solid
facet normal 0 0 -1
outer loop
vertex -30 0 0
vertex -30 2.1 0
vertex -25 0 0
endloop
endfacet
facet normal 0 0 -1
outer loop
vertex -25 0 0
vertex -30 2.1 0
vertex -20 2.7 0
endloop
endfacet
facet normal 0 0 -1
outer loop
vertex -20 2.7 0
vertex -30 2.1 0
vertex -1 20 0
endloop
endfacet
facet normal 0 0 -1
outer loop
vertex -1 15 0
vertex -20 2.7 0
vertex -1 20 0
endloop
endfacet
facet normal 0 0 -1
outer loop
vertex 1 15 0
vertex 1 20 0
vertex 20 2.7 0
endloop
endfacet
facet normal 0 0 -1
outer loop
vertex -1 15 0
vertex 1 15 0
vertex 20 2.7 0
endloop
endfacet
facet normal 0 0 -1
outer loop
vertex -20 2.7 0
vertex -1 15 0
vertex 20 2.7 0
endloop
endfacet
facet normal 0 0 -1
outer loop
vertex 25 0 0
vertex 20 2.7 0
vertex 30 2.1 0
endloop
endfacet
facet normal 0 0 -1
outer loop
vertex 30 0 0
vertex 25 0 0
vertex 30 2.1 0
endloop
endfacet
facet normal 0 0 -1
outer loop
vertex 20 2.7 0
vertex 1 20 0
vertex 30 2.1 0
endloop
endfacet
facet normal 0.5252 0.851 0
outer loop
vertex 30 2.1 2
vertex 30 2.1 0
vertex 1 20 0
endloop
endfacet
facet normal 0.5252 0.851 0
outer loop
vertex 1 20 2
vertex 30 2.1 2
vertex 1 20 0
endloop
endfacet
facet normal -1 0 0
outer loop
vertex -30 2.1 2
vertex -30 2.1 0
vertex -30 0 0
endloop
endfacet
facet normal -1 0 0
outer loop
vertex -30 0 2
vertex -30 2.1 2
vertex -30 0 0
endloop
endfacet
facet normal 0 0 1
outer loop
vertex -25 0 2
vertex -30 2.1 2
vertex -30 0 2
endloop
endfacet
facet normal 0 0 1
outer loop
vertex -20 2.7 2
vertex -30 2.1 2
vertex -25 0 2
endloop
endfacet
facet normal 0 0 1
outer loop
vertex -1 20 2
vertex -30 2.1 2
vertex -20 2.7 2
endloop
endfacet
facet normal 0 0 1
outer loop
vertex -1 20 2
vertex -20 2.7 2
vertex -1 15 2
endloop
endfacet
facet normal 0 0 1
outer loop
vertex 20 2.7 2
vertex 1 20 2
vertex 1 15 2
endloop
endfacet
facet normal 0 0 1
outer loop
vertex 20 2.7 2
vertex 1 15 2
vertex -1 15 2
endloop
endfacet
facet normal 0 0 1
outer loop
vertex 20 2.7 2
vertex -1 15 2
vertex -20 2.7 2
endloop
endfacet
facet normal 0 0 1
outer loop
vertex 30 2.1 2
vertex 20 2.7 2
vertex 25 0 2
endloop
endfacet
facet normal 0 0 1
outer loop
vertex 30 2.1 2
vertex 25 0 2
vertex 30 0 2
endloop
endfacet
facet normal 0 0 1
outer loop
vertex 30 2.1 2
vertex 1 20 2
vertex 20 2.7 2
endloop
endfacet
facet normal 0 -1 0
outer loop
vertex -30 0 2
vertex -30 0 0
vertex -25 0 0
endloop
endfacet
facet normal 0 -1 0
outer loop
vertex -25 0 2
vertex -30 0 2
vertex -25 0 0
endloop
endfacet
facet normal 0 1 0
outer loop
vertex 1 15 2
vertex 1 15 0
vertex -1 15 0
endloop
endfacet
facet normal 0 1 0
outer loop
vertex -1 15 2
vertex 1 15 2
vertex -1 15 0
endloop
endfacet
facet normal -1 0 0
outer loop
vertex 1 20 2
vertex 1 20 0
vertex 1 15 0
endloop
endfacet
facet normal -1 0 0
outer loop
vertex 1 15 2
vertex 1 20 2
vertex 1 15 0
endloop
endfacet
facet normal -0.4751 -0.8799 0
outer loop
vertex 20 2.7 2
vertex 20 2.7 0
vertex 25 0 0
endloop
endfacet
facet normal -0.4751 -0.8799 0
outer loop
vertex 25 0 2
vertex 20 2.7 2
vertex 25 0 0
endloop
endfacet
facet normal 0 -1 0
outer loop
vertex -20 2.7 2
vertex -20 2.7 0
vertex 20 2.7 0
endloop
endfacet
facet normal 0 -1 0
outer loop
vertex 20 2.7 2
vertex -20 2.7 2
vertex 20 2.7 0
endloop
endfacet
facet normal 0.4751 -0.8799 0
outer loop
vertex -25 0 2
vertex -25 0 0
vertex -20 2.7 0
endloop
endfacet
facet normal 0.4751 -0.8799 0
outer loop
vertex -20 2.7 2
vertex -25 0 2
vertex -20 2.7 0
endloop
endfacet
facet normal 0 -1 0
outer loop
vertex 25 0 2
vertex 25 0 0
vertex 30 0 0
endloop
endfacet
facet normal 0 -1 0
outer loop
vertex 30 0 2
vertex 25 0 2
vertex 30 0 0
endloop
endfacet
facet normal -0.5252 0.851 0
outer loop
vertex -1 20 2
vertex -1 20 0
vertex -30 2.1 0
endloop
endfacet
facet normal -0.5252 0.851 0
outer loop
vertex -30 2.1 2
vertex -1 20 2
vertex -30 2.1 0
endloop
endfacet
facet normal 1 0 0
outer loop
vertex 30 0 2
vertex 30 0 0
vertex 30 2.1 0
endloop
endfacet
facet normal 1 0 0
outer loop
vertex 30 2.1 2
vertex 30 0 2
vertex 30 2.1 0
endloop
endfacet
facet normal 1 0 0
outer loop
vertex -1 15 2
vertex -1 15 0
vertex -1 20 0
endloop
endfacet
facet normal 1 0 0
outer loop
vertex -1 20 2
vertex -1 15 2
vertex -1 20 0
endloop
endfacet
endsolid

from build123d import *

# Parameters (mm, degrees)
F1_DEPTH = 2


with BuildPart() as f1:
    # F0 (on Top) → F1 (new body)
    with BuildSketch(Plane.XY):
        Polygon((-30, 0), (-25, 0), (-20, 2.7), (0, 2.7), (0, 15), (-1, 15), (-1, 20), (-30, 2.1), align=None)
        Polygon((0, 15), (0, 2.7), (20, 2.7), (25, 0), (30, 0), (30, 2.1), (1, 20), (1, 15), align=None)
    extrude(amount=F1_DEPTH)


solid = f1.part
